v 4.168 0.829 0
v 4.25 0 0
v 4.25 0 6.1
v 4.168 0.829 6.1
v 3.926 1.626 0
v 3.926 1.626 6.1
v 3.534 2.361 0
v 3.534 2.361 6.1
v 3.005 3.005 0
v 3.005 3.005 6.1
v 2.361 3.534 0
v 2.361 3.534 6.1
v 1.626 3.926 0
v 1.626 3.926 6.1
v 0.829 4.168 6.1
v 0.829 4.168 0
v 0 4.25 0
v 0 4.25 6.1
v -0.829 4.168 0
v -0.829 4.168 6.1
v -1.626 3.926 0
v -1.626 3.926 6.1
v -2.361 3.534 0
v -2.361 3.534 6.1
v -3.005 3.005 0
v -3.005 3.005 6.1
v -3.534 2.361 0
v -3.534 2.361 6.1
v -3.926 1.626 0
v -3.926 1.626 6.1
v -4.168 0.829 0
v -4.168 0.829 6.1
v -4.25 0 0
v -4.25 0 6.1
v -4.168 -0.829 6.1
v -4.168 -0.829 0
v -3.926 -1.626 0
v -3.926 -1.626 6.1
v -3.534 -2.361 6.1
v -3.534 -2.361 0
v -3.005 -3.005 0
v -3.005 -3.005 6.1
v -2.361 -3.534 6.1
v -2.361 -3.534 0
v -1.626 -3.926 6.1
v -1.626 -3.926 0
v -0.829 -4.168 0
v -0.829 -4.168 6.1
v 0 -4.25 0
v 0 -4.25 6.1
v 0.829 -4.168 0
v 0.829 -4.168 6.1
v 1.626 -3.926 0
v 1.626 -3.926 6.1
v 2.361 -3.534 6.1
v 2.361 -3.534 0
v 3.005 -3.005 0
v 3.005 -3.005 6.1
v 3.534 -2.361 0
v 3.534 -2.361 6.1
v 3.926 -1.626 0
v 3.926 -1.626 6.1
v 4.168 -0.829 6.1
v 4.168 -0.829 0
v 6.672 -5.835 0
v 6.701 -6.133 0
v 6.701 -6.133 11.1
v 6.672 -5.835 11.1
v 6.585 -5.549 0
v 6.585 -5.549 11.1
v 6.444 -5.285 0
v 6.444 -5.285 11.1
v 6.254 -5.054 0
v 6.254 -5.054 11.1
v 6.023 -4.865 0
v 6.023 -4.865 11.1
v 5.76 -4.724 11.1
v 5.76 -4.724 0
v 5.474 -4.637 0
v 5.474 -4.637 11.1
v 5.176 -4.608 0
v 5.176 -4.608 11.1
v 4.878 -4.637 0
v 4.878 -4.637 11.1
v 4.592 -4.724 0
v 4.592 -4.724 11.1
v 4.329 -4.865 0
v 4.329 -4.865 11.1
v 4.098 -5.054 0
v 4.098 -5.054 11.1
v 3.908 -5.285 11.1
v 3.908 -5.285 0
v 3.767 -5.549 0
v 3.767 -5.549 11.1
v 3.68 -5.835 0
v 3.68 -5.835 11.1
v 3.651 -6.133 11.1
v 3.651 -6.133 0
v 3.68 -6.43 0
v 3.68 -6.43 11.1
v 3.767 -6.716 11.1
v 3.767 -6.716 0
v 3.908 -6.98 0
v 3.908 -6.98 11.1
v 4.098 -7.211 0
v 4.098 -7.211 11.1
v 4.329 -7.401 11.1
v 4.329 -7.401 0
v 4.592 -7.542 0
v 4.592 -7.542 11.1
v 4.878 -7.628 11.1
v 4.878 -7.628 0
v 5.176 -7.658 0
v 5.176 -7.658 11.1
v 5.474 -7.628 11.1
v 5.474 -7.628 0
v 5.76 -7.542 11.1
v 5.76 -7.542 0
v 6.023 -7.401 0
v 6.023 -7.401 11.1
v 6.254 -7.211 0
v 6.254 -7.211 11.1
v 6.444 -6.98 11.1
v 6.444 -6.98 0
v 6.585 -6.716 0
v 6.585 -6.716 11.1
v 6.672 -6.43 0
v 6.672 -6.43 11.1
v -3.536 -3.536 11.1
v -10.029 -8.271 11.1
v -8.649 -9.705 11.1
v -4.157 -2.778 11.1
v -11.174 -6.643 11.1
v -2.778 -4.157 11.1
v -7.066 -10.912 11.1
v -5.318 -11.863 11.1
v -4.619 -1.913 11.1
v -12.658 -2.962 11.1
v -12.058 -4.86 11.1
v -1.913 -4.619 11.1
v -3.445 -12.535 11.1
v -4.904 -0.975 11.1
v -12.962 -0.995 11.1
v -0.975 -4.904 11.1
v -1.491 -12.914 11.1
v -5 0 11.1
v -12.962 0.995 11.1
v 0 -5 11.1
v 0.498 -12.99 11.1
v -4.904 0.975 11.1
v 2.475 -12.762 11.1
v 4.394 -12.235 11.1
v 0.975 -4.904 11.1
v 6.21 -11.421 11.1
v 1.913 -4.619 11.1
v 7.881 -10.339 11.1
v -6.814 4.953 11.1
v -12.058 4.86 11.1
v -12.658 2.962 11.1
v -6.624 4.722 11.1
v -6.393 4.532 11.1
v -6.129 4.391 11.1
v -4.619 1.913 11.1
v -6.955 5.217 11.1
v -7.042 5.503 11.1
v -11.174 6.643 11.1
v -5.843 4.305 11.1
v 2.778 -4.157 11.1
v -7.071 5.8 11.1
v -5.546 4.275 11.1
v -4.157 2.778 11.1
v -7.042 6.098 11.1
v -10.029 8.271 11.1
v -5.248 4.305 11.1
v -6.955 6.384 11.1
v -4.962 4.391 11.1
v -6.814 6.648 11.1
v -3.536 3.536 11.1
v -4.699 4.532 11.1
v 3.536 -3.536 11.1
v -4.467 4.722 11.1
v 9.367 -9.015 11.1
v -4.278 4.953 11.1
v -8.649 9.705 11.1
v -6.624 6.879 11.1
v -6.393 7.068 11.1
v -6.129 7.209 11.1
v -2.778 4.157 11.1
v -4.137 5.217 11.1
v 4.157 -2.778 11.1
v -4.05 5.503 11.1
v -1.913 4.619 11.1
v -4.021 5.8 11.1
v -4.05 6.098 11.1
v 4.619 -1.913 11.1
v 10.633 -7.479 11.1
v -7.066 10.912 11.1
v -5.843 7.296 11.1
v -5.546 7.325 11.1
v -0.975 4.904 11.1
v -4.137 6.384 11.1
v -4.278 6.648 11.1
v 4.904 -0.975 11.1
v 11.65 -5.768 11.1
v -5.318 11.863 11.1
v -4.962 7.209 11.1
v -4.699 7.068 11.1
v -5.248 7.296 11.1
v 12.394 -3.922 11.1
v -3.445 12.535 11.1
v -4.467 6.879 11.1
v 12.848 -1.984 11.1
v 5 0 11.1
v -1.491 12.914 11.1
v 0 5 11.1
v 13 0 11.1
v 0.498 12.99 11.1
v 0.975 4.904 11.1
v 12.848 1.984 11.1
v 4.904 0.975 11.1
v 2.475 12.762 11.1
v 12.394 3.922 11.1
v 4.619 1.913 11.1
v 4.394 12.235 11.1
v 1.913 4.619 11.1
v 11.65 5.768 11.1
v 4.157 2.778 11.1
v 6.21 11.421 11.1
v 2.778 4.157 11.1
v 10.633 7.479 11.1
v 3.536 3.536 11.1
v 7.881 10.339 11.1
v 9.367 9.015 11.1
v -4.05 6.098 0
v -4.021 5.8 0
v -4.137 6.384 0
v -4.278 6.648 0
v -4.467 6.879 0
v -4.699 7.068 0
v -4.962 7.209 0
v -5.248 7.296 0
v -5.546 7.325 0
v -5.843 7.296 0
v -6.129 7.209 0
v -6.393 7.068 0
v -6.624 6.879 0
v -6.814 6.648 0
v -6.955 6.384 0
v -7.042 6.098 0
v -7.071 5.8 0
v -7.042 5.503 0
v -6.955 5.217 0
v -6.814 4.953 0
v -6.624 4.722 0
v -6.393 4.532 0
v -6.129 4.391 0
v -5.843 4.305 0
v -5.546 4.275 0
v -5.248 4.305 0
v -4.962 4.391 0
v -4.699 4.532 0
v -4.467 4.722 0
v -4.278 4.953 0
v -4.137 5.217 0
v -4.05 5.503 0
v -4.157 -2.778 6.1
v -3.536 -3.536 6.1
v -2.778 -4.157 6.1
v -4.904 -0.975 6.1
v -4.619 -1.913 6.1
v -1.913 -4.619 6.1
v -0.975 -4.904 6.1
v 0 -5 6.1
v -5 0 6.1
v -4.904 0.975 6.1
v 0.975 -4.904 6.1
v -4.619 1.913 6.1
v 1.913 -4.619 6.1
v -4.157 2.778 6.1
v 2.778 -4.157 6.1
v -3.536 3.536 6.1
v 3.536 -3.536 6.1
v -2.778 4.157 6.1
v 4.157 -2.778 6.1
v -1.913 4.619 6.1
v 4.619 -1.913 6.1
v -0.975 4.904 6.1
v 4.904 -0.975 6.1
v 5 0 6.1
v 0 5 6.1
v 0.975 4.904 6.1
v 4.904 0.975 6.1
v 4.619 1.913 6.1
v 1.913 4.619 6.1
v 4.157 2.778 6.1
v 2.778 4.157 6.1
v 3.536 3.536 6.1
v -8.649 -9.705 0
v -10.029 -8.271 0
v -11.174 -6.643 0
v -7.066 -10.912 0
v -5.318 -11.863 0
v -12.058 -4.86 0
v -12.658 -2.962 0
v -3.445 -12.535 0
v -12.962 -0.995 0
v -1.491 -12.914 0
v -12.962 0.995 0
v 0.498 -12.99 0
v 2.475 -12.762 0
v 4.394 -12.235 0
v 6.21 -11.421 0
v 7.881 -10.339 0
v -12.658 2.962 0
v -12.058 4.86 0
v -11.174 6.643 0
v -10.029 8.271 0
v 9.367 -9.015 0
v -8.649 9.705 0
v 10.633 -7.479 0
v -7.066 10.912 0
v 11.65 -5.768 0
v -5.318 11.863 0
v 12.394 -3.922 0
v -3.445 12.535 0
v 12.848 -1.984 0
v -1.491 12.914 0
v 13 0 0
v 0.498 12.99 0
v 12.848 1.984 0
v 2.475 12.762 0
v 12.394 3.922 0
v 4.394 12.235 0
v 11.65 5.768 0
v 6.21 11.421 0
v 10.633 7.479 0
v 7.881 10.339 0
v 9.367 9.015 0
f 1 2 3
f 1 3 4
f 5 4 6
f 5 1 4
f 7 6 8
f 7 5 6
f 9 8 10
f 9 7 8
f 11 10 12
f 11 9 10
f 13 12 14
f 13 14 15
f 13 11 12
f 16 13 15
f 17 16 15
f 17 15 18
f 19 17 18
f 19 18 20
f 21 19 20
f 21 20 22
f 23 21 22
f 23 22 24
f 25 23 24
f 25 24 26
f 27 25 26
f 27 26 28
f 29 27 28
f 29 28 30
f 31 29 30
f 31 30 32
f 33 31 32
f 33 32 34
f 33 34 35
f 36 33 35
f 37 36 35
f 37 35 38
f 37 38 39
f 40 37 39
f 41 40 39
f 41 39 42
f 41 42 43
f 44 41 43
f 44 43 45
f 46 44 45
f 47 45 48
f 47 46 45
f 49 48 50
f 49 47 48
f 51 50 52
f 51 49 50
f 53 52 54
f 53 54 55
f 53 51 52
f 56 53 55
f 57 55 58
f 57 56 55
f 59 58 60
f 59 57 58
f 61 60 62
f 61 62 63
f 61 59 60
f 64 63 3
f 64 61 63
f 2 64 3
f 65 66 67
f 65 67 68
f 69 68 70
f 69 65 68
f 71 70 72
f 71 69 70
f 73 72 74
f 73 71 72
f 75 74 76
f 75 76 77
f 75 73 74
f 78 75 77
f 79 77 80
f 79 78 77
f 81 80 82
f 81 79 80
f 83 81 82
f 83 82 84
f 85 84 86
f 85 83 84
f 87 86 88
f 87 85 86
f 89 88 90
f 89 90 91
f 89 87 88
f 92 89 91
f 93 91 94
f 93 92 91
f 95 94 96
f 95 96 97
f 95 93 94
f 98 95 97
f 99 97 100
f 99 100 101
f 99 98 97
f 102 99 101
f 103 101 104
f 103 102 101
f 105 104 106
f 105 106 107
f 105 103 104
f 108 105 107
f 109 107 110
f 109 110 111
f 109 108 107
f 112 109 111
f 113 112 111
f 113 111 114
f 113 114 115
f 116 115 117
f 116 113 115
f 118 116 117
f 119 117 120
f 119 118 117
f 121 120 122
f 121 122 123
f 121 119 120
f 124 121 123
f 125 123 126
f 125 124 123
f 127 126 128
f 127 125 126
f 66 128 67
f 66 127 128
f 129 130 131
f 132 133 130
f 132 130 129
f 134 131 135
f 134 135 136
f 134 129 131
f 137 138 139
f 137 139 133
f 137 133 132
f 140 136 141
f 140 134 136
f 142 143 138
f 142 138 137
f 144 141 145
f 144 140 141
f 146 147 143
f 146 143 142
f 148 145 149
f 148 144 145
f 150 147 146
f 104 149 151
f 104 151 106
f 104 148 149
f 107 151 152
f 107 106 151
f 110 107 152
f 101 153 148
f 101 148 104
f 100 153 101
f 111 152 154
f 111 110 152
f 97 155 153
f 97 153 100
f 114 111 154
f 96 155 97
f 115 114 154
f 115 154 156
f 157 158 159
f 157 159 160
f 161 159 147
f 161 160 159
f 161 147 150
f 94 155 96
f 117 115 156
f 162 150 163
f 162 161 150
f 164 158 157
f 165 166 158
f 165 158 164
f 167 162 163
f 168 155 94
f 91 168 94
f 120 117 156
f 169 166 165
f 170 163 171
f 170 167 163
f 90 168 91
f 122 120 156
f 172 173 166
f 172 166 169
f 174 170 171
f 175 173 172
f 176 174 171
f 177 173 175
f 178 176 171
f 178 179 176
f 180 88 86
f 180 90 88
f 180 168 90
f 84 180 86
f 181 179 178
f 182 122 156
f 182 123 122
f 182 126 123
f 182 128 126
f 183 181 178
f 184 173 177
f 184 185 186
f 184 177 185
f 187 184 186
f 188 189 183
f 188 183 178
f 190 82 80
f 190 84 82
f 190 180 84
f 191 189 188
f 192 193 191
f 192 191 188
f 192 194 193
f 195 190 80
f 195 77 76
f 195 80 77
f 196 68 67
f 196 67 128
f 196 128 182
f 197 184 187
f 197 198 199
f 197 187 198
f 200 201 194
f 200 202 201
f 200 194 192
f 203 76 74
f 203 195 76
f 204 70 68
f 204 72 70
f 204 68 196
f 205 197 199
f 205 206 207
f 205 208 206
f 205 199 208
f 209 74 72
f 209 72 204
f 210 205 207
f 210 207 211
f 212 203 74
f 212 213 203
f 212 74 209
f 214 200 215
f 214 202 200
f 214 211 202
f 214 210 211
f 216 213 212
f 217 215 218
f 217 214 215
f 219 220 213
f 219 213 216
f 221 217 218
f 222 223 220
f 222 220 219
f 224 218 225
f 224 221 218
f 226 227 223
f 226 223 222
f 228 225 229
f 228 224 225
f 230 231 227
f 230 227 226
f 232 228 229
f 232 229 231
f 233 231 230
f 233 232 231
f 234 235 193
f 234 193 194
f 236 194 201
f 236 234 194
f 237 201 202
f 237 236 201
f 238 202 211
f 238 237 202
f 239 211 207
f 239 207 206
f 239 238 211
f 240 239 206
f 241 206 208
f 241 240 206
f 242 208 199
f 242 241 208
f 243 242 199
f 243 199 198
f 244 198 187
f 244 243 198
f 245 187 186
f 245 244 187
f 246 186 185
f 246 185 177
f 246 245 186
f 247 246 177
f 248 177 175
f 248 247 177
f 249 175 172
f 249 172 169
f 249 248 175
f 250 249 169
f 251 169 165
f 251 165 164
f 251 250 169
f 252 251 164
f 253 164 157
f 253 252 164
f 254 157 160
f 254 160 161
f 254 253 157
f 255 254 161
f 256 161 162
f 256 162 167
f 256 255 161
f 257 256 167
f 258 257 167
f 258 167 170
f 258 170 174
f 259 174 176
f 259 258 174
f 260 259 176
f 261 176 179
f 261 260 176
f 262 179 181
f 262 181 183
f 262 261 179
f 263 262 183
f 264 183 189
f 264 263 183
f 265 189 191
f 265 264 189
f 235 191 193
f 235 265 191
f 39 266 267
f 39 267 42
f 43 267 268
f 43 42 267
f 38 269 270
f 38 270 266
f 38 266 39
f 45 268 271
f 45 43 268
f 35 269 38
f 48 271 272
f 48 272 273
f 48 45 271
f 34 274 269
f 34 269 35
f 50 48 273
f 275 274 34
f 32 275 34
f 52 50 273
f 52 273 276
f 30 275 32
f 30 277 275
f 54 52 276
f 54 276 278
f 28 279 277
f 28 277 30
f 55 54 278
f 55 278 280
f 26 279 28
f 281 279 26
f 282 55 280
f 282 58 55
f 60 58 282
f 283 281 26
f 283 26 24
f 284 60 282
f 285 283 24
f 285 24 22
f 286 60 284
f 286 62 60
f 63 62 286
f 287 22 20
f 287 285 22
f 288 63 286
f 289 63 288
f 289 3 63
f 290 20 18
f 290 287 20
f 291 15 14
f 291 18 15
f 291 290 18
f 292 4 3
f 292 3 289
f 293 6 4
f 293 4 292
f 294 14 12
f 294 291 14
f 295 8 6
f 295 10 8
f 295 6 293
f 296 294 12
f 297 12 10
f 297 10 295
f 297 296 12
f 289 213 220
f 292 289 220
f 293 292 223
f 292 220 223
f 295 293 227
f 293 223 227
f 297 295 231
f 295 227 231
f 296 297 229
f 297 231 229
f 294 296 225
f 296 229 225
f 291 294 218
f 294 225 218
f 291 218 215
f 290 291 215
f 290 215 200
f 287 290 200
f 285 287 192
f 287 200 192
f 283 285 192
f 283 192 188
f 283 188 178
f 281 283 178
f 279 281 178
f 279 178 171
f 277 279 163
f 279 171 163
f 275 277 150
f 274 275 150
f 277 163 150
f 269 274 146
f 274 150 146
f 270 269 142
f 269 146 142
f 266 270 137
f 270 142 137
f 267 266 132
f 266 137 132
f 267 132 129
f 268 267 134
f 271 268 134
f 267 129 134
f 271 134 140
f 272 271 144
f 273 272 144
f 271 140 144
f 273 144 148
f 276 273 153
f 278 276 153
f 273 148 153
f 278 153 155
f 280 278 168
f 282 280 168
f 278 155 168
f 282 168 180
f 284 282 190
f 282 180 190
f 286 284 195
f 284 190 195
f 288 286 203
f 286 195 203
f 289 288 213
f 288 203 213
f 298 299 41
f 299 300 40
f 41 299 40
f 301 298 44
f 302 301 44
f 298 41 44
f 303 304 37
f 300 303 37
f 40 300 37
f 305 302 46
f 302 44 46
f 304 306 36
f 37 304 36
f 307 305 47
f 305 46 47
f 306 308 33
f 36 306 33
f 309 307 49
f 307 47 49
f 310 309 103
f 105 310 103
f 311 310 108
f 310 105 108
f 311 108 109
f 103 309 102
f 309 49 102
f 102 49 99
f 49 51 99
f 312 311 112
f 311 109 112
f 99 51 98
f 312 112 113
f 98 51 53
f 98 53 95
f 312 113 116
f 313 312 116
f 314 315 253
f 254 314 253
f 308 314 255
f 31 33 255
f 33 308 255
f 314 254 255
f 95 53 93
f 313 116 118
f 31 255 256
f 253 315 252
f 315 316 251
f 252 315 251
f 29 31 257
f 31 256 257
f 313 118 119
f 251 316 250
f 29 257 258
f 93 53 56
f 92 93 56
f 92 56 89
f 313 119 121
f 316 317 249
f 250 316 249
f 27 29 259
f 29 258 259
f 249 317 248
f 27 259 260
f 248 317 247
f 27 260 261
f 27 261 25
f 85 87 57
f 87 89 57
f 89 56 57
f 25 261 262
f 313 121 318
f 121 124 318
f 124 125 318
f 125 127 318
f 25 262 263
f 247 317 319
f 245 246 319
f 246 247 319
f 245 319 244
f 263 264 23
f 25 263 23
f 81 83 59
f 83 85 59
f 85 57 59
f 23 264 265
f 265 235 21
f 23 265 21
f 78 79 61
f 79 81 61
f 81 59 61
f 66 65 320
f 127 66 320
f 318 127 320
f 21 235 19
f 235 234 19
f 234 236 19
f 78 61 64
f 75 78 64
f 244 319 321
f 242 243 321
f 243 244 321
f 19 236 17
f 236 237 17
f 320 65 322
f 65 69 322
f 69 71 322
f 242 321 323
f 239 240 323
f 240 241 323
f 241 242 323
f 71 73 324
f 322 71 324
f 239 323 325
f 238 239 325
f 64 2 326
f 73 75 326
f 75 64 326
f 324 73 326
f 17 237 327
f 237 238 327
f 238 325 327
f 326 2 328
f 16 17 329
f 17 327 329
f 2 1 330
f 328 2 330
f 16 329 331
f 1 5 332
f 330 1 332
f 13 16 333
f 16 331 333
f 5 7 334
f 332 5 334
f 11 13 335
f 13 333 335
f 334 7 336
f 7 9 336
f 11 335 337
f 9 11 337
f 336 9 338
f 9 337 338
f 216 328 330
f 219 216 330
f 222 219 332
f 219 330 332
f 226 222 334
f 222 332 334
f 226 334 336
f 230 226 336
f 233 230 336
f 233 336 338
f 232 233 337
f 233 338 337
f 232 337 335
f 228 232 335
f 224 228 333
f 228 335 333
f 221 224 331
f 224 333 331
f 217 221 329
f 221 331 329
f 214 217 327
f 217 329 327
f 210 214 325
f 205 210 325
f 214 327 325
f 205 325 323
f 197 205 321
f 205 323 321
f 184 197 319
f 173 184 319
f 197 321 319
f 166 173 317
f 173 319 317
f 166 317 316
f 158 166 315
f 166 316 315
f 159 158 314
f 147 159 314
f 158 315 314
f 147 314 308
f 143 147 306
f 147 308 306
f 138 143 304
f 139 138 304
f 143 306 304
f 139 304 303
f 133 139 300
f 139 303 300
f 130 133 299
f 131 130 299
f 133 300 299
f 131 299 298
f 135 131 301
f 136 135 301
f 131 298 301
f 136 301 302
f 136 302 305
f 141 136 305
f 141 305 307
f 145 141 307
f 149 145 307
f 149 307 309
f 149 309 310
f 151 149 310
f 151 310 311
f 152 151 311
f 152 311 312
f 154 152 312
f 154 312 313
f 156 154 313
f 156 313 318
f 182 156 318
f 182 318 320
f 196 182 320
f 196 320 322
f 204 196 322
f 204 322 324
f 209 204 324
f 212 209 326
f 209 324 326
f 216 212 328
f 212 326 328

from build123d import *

# Parameters (mm, degrees)
F0_R     = 13
F0_R_2   = 1.525
F0_R_3   = 4.25
F1_DEPTH = 11.1
F2_R     = 5
F2_R_2   = 4.25
F3_DEPTH = 5


with BuildPart() as f1:
    # F0 (on Top) → F1 (new body)
    with BuildSketch(Plane.XY):
        Circle(F0_R)
        with Locations((5.176005, -6.132667)):
            Circle(F0_R_2, mode=Mode.SUBTRACT)
        with Locations((-5.545808, 5.8004)):
            Circle(F0_R_2, mode=Mode.SUBTRACT)
        Circle(F0_R_3, mode=Mode.SUBTRACT)
    extrude(amount=F1_DEPTH)

    # F2 (on face) → F3 (cut)
    with BuildSketch(Plane.XY.offset(11.1)):
        Circle(F2_R)
        Circle(F2_R_2, mode=Mode.SUBTRACT)
    extrude(amount=-F3_DEPTH, mode=Mode.SUBTRACT)


solid = f1.part
